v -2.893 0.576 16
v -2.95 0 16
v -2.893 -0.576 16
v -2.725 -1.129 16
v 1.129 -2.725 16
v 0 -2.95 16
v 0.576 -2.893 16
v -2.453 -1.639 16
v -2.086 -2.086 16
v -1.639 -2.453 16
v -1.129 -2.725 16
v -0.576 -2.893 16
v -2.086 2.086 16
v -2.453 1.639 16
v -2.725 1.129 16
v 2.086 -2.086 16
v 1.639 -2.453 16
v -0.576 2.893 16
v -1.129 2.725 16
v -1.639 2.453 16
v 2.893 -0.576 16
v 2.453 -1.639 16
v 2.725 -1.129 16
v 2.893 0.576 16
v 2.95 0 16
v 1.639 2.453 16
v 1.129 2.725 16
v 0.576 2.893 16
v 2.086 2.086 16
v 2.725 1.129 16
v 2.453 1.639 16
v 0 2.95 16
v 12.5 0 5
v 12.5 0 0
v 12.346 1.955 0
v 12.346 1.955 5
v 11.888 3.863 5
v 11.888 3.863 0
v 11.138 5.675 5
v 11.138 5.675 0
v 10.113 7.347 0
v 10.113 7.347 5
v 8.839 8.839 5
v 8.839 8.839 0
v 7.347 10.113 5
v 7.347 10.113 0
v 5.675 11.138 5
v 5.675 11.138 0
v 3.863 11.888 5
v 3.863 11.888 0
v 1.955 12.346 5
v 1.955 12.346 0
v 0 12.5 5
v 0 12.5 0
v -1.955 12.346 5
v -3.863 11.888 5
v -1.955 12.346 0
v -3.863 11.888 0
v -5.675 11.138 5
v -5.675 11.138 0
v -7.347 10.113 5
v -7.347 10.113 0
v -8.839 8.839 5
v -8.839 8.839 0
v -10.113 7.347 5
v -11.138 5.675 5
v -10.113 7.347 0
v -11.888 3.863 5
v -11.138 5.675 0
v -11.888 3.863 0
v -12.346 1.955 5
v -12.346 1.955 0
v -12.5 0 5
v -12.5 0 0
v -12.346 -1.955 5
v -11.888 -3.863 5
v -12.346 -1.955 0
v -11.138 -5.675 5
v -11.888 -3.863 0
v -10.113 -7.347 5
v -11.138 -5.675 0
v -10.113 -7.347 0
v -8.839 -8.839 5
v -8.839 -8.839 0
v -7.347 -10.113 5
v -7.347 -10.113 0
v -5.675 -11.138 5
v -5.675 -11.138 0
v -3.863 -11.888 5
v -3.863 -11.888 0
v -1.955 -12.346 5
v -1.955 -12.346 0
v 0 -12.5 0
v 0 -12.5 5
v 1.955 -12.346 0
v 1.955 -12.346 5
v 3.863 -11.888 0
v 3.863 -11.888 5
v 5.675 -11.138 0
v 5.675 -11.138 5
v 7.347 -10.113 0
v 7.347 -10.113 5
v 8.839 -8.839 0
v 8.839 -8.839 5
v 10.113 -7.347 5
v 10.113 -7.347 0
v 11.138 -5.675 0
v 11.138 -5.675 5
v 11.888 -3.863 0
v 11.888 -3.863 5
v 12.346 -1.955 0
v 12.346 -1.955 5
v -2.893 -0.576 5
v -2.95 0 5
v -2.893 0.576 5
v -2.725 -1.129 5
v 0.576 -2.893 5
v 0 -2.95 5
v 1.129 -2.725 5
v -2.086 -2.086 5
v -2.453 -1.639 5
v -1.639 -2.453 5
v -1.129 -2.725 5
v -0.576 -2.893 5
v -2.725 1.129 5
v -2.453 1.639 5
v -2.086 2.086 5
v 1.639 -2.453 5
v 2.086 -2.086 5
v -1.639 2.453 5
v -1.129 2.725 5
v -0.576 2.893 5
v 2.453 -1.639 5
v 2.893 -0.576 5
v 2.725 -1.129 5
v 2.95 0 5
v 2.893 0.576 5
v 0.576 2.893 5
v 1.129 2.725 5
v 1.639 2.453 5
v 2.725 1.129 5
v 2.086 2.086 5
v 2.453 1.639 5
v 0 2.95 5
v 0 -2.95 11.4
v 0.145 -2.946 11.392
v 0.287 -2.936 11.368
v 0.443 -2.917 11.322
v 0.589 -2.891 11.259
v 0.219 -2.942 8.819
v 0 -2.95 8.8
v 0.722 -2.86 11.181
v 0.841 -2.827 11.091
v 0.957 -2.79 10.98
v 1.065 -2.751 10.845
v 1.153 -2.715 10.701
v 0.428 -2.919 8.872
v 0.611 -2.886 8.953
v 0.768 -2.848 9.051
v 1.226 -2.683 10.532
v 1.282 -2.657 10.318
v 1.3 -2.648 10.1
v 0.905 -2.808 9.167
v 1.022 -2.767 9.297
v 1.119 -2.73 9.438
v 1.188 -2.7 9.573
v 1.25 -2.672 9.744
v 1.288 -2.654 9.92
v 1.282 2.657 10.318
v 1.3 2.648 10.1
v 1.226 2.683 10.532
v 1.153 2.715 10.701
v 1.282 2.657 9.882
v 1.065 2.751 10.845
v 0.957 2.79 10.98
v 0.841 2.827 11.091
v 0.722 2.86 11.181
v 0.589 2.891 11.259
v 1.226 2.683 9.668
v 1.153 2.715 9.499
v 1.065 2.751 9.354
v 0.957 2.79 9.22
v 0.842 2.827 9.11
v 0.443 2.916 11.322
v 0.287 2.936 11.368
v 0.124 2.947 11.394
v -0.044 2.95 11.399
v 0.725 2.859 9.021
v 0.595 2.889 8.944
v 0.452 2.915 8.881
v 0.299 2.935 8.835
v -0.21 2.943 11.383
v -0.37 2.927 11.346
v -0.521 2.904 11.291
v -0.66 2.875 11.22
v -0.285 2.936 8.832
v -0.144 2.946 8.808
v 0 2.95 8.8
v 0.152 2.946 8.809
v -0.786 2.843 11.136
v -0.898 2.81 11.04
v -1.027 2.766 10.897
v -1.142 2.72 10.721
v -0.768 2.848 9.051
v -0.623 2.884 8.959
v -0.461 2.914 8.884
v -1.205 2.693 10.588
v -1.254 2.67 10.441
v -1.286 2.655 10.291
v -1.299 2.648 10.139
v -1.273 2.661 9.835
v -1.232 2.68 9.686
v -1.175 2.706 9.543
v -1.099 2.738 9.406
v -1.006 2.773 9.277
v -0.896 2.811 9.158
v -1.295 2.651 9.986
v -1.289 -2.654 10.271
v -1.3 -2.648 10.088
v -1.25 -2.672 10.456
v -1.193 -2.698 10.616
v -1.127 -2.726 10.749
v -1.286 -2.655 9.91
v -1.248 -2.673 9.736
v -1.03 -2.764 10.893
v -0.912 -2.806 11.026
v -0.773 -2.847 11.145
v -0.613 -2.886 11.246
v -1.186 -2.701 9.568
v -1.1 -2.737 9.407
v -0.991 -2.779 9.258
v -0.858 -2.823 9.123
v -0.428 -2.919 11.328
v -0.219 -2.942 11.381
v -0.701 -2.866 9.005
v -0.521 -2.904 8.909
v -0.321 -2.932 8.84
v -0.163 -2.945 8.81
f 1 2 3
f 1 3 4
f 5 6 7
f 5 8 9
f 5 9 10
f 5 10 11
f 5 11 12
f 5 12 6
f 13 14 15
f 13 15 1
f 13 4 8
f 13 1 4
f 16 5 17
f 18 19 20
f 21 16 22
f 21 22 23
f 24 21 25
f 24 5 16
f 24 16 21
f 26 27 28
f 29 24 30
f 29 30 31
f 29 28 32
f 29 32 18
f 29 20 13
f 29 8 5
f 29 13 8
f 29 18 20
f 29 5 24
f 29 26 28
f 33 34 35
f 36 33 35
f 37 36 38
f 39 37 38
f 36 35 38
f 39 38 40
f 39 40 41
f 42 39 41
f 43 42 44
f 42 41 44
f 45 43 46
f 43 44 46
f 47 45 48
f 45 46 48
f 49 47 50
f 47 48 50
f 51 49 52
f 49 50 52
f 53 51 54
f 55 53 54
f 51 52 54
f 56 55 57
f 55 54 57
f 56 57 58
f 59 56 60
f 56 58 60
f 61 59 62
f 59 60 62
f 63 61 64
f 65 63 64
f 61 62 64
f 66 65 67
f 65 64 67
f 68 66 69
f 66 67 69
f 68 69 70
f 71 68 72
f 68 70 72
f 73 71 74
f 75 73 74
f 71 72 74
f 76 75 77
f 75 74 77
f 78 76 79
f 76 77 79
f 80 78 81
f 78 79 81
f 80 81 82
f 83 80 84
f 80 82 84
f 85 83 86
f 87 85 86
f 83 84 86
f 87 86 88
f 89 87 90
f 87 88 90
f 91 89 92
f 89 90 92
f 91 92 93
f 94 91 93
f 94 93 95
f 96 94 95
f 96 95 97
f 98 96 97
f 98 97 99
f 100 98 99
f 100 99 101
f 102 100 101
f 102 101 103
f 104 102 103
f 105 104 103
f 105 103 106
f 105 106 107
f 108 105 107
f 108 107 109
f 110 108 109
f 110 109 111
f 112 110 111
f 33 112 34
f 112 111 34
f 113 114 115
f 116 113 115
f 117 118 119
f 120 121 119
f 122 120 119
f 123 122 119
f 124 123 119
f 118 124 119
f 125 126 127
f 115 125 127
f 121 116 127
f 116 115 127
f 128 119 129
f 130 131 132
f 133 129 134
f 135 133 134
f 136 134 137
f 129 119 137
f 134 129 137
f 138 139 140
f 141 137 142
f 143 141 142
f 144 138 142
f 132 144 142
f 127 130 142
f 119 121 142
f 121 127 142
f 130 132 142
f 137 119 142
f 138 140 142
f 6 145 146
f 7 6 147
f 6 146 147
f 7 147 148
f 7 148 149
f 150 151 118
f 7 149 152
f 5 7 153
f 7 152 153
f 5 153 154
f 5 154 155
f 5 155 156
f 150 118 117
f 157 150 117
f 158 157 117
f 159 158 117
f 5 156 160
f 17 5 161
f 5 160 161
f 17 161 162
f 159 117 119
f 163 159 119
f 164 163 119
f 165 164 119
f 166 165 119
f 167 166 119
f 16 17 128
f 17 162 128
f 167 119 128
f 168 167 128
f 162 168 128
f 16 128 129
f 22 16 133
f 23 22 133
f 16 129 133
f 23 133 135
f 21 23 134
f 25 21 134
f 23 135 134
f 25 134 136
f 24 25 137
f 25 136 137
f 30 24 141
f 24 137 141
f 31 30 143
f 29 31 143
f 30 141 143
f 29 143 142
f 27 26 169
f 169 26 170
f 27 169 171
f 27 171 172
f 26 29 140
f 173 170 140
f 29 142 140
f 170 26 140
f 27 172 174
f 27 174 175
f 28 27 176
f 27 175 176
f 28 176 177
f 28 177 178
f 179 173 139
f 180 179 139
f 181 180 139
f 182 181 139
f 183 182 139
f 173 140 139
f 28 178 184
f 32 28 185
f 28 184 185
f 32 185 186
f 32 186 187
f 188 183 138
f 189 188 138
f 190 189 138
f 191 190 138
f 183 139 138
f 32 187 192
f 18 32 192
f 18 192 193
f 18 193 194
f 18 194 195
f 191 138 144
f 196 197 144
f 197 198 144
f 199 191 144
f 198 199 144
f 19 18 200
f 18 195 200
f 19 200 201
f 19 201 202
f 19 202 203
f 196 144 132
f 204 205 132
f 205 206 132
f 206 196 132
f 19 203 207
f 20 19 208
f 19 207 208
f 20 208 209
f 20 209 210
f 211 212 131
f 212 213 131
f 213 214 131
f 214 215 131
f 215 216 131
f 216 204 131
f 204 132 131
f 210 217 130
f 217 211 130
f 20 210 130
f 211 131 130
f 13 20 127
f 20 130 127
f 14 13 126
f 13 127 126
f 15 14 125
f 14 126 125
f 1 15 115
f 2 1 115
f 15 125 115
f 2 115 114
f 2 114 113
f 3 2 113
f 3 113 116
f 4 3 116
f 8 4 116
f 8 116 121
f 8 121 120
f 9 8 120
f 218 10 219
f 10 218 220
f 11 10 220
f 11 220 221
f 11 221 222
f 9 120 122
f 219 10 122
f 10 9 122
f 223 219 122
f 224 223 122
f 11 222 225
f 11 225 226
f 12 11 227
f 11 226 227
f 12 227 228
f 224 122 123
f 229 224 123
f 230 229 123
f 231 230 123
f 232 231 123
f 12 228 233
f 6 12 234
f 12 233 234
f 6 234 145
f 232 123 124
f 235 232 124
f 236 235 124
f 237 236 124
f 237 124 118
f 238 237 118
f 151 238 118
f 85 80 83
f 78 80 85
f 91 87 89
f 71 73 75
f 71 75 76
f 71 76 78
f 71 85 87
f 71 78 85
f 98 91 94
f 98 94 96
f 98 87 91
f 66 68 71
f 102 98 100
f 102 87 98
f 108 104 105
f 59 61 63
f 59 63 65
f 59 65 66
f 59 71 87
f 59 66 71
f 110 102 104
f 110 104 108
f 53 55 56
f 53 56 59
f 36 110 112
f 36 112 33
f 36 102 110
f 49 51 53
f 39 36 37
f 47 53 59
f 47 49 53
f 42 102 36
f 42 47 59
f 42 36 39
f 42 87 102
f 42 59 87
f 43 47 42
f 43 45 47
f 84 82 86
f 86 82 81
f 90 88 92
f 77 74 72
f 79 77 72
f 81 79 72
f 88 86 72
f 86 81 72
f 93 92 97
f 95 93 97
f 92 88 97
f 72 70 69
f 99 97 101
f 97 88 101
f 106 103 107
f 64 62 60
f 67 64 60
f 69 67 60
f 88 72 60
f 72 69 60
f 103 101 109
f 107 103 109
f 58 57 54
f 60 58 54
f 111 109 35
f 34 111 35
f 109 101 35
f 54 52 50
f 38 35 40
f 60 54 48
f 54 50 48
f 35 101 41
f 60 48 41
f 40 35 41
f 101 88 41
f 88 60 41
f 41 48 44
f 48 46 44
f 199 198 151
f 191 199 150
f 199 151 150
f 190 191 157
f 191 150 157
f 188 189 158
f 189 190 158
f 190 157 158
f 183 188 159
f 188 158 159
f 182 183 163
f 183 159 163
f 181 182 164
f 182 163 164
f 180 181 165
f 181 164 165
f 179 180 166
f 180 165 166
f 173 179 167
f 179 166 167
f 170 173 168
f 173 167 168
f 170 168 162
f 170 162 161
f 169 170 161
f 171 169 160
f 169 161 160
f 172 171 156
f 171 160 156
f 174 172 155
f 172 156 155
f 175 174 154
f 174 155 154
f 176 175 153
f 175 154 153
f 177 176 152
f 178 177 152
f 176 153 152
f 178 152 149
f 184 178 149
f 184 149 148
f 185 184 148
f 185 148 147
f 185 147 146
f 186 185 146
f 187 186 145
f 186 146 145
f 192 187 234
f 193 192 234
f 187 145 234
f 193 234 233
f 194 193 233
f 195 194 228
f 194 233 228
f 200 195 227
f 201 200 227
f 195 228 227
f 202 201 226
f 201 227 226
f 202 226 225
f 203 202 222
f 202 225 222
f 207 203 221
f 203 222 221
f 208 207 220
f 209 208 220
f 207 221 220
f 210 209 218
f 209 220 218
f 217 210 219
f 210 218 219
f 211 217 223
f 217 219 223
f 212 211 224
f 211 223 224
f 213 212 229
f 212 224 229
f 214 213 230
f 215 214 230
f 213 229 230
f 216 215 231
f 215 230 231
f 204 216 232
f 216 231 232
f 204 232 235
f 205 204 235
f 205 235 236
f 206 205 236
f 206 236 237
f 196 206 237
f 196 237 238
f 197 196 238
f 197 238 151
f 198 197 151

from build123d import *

# Parameters (mm, degrees)
F1_R     = 12.5
F2_DEPTH = 5
F6_DEPTH = 11
F9_DEPTH = 15.451


with BuildPart() as f2:
    # F1 (on Top) → F2 (new body)
    with BuildSketch(Plane.XY):
        Circle(F1_R)
    extrude(amount=F2_DEPTH)


with BuildPart() as f6:
    # F5 (on face) → F6 (new body)
    with BuildSketch(Plane.XY.offset(5)):
        with BuildLine():
            Line((0, 0), (-2.95, 0))
            ThreePointArc((-2.95, 0), (-2.0859650045, -2.0859650045), (0, -2.95))
            Line((0, -2.95), (0, 0))
        make_face()
        with BuildLine():
            ThreePointArc((0, -2.95), (2.0859650045, -2.0859650045), (2.95, 0))
            ThreePointArc((2.95, 0), (0, 2.95), (-2.95, 0))
            Line((-2.95, 0), (0, 0))
            Line((0, 0), (0, -2.95))
        make_face()
    extrude(amount=F6_DEPTH)

    # F8 (on offset) → F9 (cut, through all)
    with BuildSketch(Plane.XZ.offset(2.95)):
        with BuildLine():
            ThreePointArc((0, 8.8), (0.9192388155, 9.1807611845), (1.3, 10.1))
            ThreePointArc((1.3, 10.1), (-0.9192388155, 11.0192388155), (0, 8.8))
        make_face()
    extrude(amount=-F9_DEPTH, mode=Mode.SUBTRACT)


solid = Compound([f2.part, f6.part])
